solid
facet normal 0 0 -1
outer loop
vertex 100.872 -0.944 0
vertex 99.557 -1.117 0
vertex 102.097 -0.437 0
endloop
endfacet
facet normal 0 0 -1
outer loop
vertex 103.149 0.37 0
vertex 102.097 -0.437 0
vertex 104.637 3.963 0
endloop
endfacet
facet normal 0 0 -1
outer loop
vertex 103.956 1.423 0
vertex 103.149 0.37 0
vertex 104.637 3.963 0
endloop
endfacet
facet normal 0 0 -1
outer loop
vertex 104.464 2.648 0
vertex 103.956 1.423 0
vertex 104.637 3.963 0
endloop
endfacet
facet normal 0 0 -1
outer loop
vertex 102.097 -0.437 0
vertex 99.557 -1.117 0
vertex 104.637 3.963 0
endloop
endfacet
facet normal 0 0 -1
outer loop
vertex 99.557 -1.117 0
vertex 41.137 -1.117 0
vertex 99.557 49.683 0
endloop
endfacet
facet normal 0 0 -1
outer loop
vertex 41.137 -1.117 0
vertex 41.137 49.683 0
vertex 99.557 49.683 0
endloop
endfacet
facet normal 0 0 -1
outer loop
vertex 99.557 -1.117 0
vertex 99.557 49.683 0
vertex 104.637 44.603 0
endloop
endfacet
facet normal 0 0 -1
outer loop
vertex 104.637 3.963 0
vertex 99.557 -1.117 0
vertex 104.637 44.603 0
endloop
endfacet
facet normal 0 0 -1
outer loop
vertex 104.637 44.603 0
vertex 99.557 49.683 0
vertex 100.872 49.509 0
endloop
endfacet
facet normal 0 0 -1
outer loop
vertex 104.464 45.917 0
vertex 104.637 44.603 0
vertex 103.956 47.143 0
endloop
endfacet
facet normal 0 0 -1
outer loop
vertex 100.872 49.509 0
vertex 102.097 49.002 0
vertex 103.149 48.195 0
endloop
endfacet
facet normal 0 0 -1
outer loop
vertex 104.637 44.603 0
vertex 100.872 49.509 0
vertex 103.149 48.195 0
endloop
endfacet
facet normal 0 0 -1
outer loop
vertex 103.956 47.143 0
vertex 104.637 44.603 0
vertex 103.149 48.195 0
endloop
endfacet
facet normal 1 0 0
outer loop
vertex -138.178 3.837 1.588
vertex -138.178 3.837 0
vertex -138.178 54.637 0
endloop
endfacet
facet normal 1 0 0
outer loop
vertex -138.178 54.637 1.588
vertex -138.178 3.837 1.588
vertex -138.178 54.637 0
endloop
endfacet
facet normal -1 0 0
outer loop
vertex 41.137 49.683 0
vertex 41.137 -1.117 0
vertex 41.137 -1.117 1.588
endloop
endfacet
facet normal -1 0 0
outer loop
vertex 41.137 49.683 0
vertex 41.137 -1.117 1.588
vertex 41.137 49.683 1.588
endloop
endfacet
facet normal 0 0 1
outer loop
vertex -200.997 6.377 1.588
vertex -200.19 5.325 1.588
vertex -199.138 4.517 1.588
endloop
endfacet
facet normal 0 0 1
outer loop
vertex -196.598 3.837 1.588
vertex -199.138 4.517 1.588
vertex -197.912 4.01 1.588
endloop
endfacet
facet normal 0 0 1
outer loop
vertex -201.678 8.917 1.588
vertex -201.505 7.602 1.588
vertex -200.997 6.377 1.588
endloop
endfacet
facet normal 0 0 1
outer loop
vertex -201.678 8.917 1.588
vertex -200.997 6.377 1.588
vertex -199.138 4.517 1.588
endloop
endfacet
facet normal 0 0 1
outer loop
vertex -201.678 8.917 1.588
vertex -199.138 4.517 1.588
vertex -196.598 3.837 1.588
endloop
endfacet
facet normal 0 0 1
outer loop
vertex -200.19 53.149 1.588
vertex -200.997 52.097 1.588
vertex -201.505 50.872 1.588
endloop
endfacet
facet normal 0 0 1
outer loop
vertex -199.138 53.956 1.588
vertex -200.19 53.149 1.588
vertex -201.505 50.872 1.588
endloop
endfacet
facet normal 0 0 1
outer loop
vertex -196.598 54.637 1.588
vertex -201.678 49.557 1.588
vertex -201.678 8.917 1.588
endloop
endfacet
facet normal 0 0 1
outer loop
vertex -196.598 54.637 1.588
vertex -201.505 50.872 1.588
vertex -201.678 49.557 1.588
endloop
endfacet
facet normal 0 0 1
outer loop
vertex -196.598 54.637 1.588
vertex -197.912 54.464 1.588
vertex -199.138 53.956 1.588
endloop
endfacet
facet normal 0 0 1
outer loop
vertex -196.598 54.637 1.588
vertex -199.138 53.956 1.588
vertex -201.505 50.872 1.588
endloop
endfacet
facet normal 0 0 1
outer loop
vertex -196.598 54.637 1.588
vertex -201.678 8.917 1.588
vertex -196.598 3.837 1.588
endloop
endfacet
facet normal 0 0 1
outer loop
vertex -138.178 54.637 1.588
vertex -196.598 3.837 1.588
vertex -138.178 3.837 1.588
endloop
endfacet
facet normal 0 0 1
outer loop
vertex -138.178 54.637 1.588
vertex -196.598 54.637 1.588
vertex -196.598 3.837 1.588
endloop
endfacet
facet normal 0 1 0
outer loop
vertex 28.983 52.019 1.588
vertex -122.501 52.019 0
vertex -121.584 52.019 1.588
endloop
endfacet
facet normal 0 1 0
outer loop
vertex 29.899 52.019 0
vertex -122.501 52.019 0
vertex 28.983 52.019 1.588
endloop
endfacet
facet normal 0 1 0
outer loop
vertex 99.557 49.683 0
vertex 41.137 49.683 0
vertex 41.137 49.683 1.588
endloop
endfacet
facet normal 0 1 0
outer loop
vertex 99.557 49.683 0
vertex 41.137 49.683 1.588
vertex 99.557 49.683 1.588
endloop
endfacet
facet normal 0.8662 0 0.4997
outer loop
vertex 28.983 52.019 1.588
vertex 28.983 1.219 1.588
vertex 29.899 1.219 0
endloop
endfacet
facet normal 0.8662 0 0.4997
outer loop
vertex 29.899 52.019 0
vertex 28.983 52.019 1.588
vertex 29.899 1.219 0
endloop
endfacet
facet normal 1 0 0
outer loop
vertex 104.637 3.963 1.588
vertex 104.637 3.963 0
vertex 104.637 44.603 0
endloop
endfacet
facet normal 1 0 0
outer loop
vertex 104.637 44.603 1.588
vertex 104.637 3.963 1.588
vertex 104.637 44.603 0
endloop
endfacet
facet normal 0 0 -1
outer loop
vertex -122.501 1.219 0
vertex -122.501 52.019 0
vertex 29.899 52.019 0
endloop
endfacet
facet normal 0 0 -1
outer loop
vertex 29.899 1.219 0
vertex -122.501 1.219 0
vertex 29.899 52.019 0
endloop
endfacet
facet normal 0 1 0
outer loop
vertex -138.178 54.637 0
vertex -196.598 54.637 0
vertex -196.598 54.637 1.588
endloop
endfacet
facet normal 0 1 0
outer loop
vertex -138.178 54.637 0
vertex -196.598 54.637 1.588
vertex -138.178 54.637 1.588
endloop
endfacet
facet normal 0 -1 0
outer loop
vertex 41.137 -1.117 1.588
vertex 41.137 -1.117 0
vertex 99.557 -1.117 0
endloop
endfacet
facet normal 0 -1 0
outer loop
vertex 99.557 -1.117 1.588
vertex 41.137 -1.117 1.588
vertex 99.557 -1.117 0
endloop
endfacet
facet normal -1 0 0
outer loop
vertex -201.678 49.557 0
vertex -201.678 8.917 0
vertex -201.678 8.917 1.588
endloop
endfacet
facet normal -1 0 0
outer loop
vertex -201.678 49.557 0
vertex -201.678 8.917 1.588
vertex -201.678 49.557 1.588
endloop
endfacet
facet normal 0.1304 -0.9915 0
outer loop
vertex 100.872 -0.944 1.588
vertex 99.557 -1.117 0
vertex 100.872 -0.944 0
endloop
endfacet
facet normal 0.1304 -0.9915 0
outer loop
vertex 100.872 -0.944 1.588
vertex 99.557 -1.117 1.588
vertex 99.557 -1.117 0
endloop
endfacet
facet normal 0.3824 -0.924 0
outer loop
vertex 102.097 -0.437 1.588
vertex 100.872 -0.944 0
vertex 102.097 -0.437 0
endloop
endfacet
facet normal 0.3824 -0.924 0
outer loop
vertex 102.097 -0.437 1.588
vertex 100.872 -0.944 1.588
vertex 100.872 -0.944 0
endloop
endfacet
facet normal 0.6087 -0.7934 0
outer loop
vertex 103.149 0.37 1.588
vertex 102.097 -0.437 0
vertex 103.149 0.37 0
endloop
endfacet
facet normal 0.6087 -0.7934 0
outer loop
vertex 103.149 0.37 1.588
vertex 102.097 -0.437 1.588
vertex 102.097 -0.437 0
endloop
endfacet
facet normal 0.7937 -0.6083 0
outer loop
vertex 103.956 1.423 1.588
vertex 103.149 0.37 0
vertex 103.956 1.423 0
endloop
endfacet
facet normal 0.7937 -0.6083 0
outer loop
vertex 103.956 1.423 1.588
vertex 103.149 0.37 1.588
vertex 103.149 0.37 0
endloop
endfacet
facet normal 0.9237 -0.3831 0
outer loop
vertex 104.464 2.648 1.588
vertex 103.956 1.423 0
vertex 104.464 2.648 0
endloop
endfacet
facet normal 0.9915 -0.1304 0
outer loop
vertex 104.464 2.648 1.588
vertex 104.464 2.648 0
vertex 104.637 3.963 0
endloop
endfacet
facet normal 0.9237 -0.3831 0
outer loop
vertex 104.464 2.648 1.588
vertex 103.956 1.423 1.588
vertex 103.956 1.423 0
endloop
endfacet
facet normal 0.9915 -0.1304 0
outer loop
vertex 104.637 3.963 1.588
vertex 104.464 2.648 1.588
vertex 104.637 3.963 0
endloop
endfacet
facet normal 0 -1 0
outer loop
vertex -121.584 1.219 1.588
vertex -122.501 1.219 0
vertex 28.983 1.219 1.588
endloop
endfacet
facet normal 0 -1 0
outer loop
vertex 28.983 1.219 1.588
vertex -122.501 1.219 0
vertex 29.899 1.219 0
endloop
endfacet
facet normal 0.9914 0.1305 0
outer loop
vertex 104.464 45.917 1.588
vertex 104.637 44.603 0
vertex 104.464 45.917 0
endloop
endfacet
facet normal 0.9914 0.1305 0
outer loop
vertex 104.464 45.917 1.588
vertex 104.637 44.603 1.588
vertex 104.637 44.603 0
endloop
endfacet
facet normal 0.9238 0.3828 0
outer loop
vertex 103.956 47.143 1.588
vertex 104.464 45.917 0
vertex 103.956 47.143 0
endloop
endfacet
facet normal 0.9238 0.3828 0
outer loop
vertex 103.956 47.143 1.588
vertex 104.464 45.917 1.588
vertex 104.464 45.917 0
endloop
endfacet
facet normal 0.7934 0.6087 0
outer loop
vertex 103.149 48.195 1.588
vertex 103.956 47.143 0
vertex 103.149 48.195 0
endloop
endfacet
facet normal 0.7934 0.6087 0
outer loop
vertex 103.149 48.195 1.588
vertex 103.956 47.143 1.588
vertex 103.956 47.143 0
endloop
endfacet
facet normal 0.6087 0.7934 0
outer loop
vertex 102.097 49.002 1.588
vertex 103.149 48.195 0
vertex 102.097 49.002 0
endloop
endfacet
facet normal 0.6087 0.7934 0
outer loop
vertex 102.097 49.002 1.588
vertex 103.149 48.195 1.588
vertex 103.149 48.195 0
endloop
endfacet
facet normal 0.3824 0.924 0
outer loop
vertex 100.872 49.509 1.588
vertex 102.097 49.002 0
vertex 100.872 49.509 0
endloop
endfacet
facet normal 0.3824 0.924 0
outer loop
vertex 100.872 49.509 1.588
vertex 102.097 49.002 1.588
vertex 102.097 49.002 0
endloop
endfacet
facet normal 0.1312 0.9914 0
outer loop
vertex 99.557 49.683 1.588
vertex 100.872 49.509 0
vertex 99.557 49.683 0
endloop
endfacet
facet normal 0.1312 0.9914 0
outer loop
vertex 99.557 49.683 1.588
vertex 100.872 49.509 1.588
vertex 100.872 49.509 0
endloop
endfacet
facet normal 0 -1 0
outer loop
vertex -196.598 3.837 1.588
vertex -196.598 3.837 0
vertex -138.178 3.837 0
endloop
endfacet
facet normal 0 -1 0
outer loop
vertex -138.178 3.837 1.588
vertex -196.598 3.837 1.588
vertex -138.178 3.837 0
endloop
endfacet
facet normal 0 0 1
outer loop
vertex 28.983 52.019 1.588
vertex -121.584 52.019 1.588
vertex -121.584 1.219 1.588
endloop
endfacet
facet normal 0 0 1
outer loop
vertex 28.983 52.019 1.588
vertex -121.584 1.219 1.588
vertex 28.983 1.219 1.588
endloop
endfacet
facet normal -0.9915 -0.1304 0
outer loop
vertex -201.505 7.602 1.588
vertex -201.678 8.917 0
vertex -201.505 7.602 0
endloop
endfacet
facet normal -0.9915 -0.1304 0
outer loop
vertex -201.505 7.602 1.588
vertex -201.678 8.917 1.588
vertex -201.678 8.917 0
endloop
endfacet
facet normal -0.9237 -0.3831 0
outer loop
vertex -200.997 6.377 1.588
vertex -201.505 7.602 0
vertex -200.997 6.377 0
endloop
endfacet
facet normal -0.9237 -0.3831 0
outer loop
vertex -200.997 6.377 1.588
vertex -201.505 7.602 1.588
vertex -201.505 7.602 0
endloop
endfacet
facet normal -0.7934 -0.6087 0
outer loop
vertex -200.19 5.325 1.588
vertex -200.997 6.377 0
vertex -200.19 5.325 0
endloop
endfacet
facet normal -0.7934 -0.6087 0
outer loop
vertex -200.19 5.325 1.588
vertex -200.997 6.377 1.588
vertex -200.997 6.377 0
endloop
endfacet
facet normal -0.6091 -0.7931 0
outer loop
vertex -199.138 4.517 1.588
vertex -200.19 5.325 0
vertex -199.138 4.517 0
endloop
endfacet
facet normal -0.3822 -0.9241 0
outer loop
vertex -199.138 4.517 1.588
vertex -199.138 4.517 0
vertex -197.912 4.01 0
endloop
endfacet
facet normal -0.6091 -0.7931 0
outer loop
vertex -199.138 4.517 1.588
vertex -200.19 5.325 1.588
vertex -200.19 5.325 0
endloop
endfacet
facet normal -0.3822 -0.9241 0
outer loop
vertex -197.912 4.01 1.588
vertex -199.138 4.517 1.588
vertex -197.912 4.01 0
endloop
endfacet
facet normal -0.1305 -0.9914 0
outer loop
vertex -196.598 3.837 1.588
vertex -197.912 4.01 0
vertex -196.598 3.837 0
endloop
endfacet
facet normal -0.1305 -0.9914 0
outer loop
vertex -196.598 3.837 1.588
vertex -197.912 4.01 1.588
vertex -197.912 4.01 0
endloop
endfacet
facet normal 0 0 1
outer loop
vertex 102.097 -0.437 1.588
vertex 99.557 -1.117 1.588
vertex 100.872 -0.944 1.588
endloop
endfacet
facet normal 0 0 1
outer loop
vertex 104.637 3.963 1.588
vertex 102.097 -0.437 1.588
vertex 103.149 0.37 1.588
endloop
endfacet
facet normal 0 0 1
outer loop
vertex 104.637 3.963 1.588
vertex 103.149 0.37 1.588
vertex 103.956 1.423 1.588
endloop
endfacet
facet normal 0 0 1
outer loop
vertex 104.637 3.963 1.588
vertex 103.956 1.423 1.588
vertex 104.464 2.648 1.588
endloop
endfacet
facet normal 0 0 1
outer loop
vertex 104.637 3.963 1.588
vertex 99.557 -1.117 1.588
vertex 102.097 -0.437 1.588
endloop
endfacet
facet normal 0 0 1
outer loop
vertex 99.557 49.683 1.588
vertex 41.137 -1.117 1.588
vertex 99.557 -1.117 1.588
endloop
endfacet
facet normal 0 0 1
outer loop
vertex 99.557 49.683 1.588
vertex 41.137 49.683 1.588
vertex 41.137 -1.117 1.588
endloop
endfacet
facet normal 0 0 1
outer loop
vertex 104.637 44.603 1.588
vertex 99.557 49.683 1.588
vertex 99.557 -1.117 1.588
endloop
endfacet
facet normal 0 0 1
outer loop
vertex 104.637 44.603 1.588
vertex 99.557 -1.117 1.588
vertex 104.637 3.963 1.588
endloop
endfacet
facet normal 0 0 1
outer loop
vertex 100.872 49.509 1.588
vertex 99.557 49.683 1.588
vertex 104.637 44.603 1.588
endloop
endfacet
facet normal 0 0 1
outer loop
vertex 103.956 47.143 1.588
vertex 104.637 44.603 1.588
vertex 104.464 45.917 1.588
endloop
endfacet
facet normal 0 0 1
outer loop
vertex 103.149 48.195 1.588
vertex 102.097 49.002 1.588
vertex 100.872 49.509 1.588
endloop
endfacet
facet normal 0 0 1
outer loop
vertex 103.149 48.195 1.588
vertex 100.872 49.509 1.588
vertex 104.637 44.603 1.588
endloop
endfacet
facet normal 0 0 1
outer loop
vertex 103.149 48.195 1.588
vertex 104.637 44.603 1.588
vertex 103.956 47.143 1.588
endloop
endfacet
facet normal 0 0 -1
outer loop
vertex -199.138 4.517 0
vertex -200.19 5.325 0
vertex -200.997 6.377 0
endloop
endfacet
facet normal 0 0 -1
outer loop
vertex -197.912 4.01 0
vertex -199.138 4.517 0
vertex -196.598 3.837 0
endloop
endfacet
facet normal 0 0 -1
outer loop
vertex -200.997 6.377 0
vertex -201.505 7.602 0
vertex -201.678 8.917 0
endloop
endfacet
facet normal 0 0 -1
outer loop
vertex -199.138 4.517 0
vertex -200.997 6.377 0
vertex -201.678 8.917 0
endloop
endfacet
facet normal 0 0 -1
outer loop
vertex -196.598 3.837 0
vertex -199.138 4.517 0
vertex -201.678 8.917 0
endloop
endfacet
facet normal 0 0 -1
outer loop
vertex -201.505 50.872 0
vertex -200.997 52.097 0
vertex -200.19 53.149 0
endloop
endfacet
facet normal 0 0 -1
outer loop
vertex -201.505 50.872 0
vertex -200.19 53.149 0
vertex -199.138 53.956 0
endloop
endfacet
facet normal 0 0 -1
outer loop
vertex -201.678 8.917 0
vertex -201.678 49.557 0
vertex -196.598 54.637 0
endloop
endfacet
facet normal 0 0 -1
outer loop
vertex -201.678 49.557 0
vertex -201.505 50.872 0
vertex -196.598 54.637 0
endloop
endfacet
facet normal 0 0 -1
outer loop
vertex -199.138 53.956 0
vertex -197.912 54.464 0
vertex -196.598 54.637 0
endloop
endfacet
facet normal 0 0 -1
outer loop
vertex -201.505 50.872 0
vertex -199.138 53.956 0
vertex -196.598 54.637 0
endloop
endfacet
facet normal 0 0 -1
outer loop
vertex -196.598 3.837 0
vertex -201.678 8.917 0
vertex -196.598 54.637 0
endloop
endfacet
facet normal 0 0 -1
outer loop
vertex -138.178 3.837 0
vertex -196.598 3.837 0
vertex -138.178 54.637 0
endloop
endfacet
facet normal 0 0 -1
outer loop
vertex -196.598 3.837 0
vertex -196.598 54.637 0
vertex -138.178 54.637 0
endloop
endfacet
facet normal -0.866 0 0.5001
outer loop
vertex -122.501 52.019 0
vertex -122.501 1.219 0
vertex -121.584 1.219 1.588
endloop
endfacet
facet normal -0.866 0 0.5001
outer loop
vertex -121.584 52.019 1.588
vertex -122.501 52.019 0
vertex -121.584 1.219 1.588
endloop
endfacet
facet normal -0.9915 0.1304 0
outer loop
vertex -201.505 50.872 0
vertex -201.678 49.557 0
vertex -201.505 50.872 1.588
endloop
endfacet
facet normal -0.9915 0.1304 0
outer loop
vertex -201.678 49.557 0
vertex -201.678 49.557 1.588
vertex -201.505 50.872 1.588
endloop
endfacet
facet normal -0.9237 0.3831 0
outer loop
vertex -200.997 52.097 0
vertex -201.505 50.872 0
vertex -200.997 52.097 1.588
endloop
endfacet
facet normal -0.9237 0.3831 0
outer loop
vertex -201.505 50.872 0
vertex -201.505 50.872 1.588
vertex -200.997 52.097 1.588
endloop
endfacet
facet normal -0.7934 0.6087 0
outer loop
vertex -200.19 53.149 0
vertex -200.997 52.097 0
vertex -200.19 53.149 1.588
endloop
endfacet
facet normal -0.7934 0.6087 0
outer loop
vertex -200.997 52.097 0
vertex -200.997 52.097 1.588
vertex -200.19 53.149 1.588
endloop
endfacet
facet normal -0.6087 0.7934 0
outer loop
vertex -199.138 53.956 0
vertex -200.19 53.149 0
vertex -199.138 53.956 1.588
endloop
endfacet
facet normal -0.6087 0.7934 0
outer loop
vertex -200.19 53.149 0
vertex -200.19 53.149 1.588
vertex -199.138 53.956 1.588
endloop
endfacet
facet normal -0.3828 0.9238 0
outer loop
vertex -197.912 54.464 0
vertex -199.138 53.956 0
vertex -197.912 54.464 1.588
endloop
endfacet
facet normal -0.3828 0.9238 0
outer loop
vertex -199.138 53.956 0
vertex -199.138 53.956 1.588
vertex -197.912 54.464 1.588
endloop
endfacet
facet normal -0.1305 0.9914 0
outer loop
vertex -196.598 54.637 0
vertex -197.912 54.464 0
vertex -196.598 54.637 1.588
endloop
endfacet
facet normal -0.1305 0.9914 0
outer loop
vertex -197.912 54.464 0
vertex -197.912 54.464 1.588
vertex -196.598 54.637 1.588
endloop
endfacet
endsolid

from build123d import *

# Parameters (mm, degrees)
F0_W      = 152.4
F0_H      = 50.8
F1_DEPTH  = 1.5875
F2_W      = 63.5
F2_H      = 50.8
F3_DEPTH  = 1.5875
F5_DEPTH  = 50.801
F6_R      = 5.08
F8_DEPTH  = 50.801
F9_W      = 63.5
F9_H      = 50.8
F10_DEPTH = 1.5875
F11_R     = 5.08


with BuildPart() as f1:
    # F0 (on Top) → F1 (new body)
    with BuildSketch(Plane.XY):
        with Locations((-46.300732, 26.618814)):
            Rectangle(F0_W, F0_H)
    extrude(amount=F1_DEPTH)

    # F4 (on face) → F5 (cut, through all)
    with BuildSketch(Plane.XZ.offset(-1.218814)):
        Polygon((28.982724, 1.5875), (29.899268, 0), (29.899268, 1.5875), align=None)
    extrude(amount=-F5_DEPTH, mode=Mode.SUBTRACT)

    # F7 (on face) → F8 (cut, through all)
    with BuildSketch(Plane.XZ.offset(-1.218814)):
        Polygon((-122.500732, 1.5875), (-122.500732, 0), (-121.584189, 1.5875), align=None)
    extrude(amount=-F8_DEPTH, mode=Mode.SUBTRACT)


with BuildPart() as f3:
    # F2 (on Top) → F3 (new body)
    with BuildSketch(Plane.XY):
        with Locations((72.886802, 24.282538)):
            Rectangle(F2_W, F2_H)
    extrude(amount=F3_DEPTH)

    # F6
    f6_edges = [f3.edges().sort_by_distance(p)[0] for p in [
        (104.636802, -1.117462, 0.79375),
        (104.636802, 49.682538, 0.79375),
    ]]
    fillet(f6_edges, radius=F6_R)


with BuildPart() as f10:
    # F9 (on Top) → F10 (new body)
    with BuildSketch(Plane.XY):
        with Locations((-169.927657, 29.2367)):
            Rectangle(F9_W, F9_H)
    extrude(amount=F10_DEPTH)

    # F11
    f11_edges = [f10.edges().sort_by_distance(p)[0] for p in [
        (-201.677657, 3.8367, 0.79375),
        (-201.677657, 54.6367, 0.79375),
    ]]
    fillet(f11_edges, radius=F11_R)


solid = Compound([f1.part, f3.part, f10.part])
